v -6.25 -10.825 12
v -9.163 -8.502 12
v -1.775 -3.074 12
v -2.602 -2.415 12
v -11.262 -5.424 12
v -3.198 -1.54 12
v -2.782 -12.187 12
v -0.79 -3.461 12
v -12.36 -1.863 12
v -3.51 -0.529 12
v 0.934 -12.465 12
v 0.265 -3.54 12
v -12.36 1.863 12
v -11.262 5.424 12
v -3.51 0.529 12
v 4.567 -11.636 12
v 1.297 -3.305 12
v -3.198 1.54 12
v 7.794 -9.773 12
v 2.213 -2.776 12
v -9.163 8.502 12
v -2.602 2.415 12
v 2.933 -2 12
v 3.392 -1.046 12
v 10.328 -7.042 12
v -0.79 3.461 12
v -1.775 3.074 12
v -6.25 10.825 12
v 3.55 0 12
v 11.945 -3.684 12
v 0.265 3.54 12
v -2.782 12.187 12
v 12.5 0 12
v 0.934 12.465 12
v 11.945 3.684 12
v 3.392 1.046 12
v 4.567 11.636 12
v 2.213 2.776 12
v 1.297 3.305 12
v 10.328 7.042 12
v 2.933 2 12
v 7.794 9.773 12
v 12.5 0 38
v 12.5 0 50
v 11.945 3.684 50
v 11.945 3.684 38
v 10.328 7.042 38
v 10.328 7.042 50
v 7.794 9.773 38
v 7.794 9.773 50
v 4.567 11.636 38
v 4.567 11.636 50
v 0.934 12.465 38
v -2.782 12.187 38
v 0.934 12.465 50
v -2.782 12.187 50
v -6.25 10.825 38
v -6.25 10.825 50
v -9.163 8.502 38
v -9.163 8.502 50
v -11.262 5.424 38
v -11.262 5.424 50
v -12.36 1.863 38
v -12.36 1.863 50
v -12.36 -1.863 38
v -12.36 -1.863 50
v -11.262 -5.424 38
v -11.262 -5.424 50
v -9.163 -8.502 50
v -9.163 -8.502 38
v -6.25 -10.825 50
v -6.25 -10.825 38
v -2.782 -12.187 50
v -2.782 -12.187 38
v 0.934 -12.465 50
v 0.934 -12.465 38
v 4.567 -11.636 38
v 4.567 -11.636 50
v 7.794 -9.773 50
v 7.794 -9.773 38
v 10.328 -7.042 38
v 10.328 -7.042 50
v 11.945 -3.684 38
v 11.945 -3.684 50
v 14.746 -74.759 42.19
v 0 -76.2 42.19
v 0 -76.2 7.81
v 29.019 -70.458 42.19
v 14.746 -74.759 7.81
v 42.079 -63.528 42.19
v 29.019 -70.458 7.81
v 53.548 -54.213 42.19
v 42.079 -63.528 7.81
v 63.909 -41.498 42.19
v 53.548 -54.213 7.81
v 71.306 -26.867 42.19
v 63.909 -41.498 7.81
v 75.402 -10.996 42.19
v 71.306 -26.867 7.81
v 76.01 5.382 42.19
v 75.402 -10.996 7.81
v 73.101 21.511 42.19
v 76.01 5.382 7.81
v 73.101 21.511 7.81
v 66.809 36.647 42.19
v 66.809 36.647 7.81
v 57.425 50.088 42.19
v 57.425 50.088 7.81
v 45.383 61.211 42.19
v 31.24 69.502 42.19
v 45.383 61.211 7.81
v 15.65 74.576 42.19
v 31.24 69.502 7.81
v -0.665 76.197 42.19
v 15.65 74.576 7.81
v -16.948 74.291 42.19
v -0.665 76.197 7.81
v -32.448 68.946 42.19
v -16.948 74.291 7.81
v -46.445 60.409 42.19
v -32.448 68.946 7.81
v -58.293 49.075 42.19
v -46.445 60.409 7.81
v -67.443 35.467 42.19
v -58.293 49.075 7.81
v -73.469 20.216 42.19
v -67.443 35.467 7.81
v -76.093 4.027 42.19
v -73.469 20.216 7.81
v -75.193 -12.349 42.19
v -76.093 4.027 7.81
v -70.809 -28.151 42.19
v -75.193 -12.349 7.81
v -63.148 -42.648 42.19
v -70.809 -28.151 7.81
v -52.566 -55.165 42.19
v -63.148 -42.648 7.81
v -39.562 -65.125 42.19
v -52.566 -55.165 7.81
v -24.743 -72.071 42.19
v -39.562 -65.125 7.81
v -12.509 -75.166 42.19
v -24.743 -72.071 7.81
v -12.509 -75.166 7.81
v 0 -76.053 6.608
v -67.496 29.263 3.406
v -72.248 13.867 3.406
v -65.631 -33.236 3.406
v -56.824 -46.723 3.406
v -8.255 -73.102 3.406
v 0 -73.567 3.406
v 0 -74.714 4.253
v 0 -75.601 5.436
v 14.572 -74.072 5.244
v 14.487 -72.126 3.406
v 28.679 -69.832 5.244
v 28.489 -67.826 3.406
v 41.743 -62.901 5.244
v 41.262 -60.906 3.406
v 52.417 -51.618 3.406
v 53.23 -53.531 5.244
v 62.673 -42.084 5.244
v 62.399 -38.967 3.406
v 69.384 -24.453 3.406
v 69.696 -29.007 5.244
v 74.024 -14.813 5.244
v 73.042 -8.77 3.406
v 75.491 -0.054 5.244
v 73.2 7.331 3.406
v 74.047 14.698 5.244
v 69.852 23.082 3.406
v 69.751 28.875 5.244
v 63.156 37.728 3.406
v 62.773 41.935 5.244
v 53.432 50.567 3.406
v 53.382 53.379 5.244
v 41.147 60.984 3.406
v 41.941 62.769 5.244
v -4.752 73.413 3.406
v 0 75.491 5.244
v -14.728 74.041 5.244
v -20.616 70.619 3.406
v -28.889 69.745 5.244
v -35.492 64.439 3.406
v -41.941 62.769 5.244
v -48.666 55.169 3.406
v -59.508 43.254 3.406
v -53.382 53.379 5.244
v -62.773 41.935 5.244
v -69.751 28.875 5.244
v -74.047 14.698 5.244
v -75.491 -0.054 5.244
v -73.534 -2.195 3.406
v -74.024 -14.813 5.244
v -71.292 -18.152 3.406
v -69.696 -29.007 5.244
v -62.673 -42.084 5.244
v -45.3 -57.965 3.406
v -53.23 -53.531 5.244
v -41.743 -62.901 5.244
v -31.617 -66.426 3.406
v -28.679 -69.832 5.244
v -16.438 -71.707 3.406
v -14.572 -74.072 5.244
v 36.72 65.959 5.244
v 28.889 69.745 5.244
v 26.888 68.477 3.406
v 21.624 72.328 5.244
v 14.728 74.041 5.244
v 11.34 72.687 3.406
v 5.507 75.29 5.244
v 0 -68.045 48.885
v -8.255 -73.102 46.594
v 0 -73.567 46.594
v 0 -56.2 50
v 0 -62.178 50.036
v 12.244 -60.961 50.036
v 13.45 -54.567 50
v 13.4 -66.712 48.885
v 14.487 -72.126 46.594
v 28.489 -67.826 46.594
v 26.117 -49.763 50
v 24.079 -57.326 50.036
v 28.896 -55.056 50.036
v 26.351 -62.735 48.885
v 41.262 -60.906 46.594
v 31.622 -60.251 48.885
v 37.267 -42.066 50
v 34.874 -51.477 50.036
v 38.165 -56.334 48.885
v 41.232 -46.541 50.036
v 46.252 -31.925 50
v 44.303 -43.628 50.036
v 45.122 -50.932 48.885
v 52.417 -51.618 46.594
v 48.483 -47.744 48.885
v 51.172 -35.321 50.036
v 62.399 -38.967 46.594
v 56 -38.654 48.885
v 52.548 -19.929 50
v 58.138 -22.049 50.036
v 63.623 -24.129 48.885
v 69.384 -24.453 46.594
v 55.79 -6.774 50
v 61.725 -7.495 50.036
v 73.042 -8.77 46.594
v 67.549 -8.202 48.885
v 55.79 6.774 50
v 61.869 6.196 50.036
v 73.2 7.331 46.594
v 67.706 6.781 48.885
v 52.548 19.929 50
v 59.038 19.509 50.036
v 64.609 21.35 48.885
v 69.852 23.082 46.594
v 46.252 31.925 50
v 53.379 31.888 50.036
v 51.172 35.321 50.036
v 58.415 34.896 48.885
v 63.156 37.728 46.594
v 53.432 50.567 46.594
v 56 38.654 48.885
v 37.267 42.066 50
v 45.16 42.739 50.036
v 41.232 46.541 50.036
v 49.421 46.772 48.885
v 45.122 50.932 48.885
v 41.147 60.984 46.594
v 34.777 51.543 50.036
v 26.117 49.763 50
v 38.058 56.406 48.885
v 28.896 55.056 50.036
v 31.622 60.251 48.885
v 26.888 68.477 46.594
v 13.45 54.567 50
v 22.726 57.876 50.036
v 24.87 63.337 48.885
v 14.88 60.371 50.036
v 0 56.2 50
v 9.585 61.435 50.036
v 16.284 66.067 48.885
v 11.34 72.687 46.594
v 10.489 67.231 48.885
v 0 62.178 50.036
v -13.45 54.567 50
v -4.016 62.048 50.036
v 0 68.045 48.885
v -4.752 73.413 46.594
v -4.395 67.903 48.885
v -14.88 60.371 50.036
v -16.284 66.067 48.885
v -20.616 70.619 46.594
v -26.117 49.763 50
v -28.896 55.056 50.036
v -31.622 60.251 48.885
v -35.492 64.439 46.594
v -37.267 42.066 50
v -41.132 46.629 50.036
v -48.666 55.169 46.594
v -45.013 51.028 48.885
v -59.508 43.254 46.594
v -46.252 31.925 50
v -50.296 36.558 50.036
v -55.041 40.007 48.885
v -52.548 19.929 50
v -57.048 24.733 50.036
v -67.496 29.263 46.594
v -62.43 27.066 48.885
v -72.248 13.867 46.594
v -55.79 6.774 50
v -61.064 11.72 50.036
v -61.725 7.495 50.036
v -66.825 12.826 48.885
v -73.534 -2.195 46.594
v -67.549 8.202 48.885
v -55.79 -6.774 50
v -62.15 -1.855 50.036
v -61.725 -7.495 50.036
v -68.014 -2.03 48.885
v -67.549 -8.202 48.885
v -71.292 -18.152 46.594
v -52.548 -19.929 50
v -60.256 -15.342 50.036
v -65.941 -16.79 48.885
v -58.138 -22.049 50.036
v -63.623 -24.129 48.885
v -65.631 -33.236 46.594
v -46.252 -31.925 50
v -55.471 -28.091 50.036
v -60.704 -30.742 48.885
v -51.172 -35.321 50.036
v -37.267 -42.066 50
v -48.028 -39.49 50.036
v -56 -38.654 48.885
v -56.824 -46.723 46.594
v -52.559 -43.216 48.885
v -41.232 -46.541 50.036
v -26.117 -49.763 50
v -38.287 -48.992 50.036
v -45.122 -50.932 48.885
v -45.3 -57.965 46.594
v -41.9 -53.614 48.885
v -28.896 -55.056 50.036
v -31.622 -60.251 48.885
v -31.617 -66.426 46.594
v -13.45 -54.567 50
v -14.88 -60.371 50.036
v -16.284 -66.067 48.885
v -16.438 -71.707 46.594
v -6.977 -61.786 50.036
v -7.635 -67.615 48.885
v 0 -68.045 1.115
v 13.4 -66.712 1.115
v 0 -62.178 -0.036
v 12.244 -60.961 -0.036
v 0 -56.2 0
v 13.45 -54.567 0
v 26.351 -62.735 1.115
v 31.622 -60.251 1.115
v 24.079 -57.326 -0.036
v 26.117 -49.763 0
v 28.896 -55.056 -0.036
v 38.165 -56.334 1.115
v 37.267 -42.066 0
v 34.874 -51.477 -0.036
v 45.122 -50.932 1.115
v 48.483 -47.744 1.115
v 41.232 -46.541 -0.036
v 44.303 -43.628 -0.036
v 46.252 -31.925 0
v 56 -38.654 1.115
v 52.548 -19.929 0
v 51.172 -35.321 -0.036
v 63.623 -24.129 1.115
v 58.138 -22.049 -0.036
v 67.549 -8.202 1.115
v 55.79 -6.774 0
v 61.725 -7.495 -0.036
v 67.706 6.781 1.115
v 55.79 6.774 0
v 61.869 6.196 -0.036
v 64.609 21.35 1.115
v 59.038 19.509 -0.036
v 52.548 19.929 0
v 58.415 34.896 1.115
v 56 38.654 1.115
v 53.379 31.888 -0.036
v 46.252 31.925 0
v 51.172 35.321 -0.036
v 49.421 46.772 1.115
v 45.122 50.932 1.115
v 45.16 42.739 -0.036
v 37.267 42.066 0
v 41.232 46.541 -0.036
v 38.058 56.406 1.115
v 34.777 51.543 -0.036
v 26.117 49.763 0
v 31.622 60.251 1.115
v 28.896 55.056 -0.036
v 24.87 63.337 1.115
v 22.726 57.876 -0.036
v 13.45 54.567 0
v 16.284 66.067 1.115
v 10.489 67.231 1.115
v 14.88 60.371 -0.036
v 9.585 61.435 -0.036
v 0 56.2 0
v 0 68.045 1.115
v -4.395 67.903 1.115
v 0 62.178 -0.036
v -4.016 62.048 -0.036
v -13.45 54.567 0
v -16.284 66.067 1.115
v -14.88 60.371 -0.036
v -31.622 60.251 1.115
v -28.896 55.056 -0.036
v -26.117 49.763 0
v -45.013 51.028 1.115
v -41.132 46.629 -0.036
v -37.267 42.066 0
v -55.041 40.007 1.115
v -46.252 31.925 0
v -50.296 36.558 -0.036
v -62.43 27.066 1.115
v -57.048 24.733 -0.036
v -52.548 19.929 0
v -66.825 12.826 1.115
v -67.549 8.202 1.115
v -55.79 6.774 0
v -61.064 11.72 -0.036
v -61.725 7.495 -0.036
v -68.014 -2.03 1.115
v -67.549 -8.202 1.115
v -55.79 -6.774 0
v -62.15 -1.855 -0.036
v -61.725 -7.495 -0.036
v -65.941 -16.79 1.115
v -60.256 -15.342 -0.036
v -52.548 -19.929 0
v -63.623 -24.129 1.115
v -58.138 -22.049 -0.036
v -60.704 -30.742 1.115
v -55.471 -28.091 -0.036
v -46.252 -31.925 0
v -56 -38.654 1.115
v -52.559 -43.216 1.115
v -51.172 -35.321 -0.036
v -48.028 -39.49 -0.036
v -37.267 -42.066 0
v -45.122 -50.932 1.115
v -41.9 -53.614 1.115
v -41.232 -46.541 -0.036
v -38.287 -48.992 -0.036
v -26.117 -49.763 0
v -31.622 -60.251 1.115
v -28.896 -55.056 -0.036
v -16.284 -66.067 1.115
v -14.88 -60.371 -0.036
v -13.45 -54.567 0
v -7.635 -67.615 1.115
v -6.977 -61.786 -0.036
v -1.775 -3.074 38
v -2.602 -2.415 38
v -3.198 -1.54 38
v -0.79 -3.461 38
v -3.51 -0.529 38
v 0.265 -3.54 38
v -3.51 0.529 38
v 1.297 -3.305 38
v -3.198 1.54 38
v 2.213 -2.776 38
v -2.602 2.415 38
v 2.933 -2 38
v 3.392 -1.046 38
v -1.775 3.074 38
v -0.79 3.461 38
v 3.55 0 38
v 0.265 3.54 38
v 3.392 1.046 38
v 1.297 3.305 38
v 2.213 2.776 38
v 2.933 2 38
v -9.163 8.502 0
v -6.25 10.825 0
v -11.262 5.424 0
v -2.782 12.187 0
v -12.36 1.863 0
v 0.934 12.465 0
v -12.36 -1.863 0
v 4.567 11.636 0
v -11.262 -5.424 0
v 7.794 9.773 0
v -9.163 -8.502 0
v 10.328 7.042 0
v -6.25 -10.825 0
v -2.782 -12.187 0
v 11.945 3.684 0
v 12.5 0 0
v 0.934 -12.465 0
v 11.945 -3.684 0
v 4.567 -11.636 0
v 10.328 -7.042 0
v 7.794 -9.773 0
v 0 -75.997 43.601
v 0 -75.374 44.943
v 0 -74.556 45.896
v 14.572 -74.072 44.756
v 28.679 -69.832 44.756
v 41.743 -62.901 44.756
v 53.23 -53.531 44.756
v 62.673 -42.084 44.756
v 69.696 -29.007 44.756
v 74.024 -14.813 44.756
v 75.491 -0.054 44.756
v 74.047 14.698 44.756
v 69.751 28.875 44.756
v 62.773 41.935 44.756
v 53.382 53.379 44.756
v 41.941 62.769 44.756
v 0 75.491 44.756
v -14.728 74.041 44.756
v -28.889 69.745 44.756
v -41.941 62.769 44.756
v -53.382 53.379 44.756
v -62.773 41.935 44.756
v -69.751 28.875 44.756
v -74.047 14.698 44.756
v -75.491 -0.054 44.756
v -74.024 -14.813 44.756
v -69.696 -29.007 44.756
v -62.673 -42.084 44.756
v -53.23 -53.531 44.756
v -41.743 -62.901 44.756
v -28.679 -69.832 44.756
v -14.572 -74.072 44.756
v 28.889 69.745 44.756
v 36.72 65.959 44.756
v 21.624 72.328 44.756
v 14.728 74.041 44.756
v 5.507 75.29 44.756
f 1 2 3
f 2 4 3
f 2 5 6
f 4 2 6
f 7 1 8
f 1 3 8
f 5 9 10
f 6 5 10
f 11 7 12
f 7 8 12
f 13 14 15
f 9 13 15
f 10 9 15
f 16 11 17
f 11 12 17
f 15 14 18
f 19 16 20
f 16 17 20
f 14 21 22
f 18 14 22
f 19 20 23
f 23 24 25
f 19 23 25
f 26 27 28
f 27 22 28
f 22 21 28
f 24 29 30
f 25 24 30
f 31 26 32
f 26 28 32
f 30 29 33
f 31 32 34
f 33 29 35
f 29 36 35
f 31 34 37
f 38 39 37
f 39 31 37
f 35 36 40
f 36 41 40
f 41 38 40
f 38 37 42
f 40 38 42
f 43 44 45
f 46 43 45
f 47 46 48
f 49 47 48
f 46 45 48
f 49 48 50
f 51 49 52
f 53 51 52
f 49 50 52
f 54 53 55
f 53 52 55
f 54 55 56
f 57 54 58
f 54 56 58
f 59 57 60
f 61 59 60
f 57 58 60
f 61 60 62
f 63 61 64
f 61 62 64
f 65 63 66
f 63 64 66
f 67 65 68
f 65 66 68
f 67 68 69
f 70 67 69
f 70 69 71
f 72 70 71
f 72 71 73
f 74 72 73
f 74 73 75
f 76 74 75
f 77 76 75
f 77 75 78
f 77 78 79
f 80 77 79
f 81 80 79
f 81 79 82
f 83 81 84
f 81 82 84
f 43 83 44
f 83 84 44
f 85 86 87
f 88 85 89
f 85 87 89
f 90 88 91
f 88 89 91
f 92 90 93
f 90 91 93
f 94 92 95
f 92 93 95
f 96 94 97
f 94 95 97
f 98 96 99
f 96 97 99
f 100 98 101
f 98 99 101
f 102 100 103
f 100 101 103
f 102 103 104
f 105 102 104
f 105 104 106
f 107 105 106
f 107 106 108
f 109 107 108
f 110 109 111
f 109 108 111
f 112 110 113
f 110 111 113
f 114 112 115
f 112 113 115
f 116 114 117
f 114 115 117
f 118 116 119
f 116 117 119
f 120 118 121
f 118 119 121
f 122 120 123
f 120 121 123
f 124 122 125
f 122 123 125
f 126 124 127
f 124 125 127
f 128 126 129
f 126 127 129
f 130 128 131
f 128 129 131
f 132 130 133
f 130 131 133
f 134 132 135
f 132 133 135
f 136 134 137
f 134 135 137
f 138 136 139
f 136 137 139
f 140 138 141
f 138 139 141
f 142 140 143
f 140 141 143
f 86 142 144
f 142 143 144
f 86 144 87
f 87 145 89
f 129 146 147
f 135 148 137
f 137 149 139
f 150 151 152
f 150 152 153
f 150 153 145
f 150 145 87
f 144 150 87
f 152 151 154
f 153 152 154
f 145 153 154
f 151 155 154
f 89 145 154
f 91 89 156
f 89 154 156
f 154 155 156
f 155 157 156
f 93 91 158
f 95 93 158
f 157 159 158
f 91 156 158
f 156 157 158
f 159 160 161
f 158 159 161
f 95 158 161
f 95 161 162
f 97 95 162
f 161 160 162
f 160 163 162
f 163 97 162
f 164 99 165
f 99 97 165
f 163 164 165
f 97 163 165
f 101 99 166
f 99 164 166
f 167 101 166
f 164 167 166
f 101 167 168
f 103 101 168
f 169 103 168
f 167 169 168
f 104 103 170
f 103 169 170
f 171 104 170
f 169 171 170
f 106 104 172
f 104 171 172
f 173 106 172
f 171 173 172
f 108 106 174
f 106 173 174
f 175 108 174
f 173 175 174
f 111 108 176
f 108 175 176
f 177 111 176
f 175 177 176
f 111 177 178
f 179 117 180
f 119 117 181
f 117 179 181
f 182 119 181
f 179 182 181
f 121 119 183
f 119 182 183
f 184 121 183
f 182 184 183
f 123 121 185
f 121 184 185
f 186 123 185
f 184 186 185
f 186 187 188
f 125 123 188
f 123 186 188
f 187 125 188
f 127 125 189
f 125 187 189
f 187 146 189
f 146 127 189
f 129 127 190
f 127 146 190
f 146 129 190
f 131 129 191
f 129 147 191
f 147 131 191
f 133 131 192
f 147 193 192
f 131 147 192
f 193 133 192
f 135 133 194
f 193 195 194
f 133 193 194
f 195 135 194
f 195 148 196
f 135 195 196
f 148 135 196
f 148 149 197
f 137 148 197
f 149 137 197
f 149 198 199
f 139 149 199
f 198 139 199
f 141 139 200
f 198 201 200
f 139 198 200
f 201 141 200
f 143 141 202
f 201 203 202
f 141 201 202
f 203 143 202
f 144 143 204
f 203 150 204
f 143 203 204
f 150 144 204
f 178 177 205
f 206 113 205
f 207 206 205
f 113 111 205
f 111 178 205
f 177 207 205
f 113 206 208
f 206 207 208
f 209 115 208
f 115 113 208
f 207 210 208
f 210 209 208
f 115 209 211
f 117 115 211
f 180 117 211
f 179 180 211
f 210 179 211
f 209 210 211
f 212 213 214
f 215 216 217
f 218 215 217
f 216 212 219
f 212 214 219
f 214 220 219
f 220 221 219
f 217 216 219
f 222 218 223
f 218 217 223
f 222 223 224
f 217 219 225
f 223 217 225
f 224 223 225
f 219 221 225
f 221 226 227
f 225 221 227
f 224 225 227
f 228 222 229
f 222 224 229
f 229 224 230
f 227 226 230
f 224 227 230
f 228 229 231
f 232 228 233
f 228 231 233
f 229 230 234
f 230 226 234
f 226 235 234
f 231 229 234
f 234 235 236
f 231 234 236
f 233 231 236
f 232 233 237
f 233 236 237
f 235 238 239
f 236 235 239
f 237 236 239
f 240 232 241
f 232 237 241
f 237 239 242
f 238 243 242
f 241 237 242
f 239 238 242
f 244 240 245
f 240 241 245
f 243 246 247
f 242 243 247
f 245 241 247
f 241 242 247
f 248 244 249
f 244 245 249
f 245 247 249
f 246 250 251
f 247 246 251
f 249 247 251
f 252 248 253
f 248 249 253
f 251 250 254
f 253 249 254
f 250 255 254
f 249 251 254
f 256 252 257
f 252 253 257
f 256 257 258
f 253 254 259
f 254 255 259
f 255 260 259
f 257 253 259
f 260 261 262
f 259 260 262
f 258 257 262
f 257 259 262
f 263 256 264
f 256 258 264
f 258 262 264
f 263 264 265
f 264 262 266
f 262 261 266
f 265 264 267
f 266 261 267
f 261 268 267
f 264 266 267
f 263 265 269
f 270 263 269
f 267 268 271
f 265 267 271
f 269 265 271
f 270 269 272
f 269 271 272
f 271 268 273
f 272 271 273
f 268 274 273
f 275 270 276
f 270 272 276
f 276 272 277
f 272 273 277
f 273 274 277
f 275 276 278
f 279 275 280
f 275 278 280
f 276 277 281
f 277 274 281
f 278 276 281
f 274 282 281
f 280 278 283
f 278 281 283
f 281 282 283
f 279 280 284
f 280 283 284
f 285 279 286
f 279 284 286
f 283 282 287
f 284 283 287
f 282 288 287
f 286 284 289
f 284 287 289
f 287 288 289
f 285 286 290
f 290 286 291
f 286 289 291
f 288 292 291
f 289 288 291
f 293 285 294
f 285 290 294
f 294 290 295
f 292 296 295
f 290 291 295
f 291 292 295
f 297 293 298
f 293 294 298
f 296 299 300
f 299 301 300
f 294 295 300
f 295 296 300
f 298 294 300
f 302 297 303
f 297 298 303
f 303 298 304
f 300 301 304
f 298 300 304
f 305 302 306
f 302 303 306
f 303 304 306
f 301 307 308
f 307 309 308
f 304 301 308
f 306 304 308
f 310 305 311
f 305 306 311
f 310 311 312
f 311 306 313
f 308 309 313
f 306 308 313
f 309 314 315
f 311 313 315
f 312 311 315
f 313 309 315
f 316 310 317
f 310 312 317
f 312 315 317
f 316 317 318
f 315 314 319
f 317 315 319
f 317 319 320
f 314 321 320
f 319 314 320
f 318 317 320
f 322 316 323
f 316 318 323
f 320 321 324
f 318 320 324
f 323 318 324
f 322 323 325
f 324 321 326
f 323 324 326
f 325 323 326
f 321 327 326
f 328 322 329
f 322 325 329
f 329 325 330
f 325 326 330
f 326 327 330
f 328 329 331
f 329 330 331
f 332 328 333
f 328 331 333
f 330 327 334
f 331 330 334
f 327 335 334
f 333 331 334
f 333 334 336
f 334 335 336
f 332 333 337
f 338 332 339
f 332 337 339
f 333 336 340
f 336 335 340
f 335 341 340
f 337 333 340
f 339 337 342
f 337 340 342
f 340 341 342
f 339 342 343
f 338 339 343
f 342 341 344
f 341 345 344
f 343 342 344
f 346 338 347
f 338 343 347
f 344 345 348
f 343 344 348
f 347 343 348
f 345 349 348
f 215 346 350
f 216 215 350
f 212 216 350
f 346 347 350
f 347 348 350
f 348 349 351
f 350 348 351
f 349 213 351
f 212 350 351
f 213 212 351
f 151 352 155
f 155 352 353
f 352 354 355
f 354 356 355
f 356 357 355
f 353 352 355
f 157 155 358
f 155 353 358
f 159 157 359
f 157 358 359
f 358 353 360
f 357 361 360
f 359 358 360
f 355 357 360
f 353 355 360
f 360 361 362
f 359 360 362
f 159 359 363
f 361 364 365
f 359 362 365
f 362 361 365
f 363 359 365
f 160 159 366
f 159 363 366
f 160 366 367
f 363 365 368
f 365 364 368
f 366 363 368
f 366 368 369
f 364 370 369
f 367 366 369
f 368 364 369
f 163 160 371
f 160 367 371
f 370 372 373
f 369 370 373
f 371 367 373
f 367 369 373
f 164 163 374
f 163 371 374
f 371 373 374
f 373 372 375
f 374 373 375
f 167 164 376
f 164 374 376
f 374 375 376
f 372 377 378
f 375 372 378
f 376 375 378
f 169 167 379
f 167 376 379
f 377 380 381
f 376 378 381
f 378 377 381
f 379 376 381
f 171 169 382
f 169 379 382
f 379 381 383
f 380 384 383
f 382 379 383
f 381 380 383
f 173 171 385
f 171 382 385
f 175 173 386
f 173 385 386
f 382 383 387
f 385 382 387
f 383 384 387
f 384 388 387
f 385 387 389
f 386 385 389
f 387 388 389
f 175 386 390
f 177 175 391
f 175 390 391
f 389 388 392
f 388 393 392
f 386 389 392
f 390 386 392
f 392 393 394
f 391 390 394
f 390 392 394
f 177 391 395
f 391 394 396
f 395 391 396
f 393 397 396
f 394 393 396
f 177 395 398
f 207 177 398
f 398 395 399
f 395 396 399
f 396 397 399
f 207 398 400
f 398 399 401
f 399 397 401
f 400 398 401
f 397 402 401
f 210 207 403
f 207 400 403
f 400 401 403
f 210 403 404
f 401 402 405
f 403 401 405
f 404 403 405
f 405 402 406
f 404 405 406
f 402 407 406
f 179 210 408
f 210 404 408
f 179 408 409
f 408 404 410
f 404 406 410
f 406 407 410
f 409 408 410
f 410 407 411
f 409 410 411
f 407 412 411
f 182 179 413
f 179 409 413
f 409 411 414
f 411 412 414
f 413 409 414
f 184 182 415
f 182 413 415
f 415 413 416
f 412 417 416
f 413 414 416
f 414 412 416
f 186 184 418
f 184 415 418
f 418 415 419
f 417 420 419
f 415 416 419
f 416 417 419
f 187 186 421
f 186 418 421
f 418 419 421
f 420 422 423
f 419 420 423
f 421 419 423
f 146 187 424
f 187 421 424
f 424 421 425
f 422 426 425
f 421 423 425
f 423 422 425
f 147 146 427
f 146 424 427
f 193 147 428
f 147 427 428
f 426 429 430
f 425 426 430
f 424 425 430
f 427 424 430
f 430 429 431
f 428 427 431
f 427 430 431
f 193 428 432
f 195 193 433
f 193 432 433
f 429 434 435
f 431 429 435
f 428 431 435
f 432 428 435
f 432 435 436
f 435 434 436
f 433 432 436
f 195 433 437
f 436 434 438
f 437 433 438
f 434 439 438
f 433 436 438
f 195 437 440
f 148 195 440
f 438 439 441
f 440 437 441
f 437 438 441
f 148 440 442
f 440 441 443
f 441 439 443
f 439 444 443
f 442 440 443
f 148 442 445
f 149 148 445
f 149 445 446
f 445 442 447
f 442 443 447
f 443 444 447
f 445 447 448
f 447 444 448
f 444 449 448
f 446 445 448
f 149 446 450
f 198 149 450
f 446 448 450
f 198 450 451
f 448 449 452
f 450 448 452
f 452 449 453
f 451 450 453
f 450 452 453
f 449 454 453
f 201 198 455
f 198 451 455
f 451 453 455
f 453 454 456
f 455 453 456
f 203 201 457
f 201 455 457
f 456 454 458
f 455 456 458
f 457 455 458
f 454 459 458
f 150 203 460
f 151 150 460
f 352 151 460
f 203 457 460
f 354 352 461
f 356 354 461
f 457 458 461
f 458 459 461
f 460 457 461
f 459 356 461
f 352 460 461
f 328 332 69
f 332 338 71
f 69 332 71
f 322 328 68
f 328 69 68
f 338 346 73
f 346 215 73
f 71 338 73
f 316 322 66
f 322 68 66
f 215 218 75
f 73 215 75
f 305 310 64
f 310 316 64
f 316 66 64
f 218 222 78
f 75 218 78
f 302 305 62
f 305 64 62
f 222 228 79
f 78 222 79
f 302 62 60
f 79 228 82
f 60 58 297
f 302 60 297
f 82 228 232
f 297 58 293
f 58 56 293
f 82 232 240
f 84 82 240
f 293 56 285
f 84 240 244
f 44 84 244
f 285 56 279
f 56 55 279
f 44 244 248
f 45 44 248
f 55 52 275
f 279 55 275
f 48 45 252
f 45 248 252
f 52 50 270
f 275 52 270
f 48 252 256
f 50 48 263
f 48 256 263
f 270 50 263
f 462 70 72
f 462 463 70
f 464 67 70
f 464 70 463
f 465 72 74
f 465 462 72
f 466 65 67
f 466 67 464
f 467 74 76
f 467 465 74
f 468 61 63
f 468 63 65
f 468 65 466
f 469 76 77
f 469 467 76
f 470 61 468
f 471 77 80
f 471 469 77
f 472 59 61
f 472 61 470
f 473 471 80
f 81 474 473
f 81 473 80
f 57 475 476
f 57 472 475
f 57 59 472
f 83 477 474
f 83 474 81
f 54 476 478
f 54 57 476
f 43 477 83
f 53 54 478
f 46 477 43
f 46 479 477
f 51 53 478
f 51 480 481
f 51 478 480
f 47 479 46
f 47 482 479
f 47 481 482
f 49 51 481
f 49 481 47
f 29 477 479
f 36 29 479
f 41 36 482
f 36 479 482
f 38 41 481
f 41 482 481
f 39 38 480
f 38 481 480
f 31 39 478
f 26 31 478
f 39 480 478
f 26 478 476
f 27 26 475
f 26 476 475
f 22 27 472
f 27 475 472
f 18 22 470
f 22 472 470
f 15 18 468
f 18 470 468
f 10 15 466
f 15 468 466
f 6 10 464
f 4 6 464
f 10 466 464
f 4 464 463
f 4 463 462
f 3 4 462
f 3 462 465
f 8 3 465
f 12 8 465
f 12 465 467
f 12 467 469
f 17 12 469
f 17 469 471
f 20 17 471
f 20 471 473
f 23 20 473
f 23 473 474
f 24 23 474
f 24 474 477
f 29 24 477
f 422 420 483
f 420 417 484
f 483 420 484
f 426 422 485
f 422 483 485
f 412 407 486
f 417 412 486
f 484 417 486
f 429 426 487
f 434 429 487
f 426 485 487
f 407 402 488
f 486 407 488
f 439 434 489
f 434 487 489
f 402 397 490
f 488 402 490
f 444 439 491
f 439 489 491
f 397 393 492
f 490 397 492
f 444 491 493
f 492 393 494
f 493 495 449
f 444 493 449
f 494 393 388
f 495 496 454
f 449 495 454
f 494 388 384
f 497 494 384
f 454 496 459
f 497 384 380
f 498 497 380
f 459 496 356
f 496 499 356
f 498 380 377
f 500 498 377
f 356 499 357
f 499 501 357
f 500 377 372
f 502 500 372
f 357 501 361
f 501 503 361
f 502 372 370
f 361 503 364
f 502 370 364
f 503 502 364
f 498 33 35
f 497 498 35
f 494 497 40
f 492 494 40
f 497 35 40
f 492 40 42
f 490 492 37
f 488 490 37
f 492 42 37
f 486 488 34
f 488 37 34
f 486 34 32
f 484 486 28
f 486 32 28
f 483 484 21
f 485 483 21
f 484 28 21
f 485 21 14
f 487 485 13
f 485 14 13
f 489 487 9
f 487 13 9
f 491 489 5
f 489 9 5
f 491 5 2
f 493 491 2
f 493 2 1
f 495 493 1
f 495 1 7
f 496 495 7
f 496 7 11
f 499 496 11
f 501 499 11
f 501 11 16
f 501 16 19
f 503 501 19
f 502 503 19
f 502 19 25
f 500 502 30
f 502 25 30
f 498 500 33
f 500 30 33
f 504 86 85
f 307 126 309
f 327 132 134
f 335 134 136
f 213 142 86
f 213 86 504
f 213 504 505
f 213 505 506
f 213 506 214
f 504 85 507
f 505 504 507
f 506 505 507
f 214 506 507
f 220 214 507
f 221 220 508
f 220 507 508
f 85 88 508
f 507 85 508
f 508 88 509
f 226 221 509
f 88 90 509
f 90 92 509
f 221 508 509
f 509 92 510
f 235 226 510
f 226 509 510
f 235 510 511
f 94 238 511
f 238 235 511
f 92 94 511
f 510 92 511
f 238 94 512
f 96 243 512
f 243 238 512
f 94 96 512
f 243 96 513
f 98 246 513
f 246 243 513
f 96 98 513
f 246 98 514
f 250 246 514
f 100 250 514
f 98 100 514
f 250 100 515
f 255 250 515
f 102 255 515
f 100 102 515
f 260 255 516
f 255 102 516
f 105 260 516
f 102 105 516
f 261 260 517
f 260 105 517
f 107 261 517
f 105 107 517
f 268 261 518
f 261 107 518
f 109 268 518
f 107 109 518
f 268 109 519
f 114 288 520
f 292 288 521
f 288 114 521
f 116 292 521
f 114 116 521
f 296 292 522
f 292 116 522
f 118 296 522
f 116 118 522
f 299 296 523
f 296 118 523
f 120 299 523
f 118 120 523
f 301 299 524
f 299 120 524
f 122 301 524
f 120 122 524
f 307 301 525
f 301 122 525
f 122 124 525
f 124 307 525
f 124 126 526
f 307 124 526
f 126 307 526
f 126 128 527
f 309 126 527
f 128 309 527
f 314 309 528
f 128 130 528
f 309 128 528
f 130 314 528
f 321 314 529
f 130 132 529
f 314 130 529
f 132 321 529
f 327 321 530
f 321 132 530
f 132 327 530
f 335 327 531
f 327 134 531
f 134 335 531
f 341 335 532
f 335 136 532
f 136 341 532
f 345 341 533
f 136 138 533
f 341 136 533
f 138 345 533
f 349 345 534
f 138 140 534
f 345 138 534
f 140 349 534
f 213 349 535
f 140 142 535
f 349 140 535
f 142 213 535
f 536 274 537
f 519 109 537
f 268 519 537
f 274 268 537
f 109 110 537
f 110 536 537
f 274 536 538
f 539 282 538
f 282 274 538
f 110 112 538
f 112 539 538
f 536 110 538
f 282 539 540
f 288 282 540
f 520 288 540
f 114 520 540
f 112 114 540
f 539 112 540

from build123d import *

# Parameters (mm, degrees)
F2_R     = 3.55
F3_DEPTH = 50.1686232636
F2_R_2   = 12.5
F4_DEPTH = 12
F5_START = -38
F5_DEPTH = 12
F6_R     = 5


with BuildPart() as f1:
    # F0 (on Right) → F1 (revolve)
    with BuildSketch(Plane.YZ):
        with BuildLine():
            Line((-56.2, 0), (0, 0))
            Line((0, 0), (0, 50))
            Line((0, 50), (-56.2, 50))
            ThreePointArc((-56.2, 50), (-66.642974542, 49.2718981679), (-76.2, 45))
            Line((-76.2, 45), (-76.2, 5))
            ThreePointArc((-76.2, 5), (-66.642974542, 0.7281018321), (-56.2, 0))
        make_face()
    revolve(axis=Axis((0, 0, 25), (0, 0, 1)))

    # F2 (on face) → F3 (cut, through all)
    with BuildSketch(Plane.XY.offset(50)):
        Circle(F2_R)
    extrude(amount=-F3_DEPTH, mode=Mode.SUBTRACT)

    # F2 (on face) → F4 (cut)
    with BuildSketch(Plane.XY.offset(50)):
        Circle(F2_R_2)
        Polygon((-6.9282032303, 0), (-3.4641016151, 6), (3.4641016151, 6), (6.9282032303, 0), (3.4641016151, -6), (-3.4641016151, -6), align=None, mode=Mode.SUBTRACT)
        Polygon((3.4641016151, 6), (-3.4641016151, 6), (-6.9282032303, 0), (-3.4641016151, -6), (3.4641016151, -6), (6.9282032303, 0), align=None)
        Circle(F2_R, mode=Mode.SUBTRACT)
    extrude(amount=-F4_DEPTH, mode=Mode.SUBTRACT)

    # F2 (on face) → F5 (cut)
    with BuildSketch(Plane.XY.offset(50).offset(F5_START)):
        Circle(F2_R_2)
        Polygon((-6.9282032303, 0), (-3.4641016151, 6), (3.4641016151, 6), (6.9282032303, 0), (3.4641016151, -6), (-3.4641016151, -6), align=None, mode=Mode.SUBTRACT)
        Polygon((3.4641016151, 6), (-3.4641016151, 6), (-6.9282032303, 0), (-3.4641016151, -6), (3.4641016151, -6), (6.9282032303, 0), align=None)
        Circle(F2_R, mode=Mode.SUBTRACT)
    extrude(amount=-F5_DEPTH, mode=Mode.SUBTRACT)

    # F6
    f6_edges = [f1.edges().sort_by_distance(p)[0] for p in [
        (0, 76.2, 45),
        (0, 76.2, 5),
    ]]
    fillet(f6_edges, radius=F6_R)


solid = f1.part
